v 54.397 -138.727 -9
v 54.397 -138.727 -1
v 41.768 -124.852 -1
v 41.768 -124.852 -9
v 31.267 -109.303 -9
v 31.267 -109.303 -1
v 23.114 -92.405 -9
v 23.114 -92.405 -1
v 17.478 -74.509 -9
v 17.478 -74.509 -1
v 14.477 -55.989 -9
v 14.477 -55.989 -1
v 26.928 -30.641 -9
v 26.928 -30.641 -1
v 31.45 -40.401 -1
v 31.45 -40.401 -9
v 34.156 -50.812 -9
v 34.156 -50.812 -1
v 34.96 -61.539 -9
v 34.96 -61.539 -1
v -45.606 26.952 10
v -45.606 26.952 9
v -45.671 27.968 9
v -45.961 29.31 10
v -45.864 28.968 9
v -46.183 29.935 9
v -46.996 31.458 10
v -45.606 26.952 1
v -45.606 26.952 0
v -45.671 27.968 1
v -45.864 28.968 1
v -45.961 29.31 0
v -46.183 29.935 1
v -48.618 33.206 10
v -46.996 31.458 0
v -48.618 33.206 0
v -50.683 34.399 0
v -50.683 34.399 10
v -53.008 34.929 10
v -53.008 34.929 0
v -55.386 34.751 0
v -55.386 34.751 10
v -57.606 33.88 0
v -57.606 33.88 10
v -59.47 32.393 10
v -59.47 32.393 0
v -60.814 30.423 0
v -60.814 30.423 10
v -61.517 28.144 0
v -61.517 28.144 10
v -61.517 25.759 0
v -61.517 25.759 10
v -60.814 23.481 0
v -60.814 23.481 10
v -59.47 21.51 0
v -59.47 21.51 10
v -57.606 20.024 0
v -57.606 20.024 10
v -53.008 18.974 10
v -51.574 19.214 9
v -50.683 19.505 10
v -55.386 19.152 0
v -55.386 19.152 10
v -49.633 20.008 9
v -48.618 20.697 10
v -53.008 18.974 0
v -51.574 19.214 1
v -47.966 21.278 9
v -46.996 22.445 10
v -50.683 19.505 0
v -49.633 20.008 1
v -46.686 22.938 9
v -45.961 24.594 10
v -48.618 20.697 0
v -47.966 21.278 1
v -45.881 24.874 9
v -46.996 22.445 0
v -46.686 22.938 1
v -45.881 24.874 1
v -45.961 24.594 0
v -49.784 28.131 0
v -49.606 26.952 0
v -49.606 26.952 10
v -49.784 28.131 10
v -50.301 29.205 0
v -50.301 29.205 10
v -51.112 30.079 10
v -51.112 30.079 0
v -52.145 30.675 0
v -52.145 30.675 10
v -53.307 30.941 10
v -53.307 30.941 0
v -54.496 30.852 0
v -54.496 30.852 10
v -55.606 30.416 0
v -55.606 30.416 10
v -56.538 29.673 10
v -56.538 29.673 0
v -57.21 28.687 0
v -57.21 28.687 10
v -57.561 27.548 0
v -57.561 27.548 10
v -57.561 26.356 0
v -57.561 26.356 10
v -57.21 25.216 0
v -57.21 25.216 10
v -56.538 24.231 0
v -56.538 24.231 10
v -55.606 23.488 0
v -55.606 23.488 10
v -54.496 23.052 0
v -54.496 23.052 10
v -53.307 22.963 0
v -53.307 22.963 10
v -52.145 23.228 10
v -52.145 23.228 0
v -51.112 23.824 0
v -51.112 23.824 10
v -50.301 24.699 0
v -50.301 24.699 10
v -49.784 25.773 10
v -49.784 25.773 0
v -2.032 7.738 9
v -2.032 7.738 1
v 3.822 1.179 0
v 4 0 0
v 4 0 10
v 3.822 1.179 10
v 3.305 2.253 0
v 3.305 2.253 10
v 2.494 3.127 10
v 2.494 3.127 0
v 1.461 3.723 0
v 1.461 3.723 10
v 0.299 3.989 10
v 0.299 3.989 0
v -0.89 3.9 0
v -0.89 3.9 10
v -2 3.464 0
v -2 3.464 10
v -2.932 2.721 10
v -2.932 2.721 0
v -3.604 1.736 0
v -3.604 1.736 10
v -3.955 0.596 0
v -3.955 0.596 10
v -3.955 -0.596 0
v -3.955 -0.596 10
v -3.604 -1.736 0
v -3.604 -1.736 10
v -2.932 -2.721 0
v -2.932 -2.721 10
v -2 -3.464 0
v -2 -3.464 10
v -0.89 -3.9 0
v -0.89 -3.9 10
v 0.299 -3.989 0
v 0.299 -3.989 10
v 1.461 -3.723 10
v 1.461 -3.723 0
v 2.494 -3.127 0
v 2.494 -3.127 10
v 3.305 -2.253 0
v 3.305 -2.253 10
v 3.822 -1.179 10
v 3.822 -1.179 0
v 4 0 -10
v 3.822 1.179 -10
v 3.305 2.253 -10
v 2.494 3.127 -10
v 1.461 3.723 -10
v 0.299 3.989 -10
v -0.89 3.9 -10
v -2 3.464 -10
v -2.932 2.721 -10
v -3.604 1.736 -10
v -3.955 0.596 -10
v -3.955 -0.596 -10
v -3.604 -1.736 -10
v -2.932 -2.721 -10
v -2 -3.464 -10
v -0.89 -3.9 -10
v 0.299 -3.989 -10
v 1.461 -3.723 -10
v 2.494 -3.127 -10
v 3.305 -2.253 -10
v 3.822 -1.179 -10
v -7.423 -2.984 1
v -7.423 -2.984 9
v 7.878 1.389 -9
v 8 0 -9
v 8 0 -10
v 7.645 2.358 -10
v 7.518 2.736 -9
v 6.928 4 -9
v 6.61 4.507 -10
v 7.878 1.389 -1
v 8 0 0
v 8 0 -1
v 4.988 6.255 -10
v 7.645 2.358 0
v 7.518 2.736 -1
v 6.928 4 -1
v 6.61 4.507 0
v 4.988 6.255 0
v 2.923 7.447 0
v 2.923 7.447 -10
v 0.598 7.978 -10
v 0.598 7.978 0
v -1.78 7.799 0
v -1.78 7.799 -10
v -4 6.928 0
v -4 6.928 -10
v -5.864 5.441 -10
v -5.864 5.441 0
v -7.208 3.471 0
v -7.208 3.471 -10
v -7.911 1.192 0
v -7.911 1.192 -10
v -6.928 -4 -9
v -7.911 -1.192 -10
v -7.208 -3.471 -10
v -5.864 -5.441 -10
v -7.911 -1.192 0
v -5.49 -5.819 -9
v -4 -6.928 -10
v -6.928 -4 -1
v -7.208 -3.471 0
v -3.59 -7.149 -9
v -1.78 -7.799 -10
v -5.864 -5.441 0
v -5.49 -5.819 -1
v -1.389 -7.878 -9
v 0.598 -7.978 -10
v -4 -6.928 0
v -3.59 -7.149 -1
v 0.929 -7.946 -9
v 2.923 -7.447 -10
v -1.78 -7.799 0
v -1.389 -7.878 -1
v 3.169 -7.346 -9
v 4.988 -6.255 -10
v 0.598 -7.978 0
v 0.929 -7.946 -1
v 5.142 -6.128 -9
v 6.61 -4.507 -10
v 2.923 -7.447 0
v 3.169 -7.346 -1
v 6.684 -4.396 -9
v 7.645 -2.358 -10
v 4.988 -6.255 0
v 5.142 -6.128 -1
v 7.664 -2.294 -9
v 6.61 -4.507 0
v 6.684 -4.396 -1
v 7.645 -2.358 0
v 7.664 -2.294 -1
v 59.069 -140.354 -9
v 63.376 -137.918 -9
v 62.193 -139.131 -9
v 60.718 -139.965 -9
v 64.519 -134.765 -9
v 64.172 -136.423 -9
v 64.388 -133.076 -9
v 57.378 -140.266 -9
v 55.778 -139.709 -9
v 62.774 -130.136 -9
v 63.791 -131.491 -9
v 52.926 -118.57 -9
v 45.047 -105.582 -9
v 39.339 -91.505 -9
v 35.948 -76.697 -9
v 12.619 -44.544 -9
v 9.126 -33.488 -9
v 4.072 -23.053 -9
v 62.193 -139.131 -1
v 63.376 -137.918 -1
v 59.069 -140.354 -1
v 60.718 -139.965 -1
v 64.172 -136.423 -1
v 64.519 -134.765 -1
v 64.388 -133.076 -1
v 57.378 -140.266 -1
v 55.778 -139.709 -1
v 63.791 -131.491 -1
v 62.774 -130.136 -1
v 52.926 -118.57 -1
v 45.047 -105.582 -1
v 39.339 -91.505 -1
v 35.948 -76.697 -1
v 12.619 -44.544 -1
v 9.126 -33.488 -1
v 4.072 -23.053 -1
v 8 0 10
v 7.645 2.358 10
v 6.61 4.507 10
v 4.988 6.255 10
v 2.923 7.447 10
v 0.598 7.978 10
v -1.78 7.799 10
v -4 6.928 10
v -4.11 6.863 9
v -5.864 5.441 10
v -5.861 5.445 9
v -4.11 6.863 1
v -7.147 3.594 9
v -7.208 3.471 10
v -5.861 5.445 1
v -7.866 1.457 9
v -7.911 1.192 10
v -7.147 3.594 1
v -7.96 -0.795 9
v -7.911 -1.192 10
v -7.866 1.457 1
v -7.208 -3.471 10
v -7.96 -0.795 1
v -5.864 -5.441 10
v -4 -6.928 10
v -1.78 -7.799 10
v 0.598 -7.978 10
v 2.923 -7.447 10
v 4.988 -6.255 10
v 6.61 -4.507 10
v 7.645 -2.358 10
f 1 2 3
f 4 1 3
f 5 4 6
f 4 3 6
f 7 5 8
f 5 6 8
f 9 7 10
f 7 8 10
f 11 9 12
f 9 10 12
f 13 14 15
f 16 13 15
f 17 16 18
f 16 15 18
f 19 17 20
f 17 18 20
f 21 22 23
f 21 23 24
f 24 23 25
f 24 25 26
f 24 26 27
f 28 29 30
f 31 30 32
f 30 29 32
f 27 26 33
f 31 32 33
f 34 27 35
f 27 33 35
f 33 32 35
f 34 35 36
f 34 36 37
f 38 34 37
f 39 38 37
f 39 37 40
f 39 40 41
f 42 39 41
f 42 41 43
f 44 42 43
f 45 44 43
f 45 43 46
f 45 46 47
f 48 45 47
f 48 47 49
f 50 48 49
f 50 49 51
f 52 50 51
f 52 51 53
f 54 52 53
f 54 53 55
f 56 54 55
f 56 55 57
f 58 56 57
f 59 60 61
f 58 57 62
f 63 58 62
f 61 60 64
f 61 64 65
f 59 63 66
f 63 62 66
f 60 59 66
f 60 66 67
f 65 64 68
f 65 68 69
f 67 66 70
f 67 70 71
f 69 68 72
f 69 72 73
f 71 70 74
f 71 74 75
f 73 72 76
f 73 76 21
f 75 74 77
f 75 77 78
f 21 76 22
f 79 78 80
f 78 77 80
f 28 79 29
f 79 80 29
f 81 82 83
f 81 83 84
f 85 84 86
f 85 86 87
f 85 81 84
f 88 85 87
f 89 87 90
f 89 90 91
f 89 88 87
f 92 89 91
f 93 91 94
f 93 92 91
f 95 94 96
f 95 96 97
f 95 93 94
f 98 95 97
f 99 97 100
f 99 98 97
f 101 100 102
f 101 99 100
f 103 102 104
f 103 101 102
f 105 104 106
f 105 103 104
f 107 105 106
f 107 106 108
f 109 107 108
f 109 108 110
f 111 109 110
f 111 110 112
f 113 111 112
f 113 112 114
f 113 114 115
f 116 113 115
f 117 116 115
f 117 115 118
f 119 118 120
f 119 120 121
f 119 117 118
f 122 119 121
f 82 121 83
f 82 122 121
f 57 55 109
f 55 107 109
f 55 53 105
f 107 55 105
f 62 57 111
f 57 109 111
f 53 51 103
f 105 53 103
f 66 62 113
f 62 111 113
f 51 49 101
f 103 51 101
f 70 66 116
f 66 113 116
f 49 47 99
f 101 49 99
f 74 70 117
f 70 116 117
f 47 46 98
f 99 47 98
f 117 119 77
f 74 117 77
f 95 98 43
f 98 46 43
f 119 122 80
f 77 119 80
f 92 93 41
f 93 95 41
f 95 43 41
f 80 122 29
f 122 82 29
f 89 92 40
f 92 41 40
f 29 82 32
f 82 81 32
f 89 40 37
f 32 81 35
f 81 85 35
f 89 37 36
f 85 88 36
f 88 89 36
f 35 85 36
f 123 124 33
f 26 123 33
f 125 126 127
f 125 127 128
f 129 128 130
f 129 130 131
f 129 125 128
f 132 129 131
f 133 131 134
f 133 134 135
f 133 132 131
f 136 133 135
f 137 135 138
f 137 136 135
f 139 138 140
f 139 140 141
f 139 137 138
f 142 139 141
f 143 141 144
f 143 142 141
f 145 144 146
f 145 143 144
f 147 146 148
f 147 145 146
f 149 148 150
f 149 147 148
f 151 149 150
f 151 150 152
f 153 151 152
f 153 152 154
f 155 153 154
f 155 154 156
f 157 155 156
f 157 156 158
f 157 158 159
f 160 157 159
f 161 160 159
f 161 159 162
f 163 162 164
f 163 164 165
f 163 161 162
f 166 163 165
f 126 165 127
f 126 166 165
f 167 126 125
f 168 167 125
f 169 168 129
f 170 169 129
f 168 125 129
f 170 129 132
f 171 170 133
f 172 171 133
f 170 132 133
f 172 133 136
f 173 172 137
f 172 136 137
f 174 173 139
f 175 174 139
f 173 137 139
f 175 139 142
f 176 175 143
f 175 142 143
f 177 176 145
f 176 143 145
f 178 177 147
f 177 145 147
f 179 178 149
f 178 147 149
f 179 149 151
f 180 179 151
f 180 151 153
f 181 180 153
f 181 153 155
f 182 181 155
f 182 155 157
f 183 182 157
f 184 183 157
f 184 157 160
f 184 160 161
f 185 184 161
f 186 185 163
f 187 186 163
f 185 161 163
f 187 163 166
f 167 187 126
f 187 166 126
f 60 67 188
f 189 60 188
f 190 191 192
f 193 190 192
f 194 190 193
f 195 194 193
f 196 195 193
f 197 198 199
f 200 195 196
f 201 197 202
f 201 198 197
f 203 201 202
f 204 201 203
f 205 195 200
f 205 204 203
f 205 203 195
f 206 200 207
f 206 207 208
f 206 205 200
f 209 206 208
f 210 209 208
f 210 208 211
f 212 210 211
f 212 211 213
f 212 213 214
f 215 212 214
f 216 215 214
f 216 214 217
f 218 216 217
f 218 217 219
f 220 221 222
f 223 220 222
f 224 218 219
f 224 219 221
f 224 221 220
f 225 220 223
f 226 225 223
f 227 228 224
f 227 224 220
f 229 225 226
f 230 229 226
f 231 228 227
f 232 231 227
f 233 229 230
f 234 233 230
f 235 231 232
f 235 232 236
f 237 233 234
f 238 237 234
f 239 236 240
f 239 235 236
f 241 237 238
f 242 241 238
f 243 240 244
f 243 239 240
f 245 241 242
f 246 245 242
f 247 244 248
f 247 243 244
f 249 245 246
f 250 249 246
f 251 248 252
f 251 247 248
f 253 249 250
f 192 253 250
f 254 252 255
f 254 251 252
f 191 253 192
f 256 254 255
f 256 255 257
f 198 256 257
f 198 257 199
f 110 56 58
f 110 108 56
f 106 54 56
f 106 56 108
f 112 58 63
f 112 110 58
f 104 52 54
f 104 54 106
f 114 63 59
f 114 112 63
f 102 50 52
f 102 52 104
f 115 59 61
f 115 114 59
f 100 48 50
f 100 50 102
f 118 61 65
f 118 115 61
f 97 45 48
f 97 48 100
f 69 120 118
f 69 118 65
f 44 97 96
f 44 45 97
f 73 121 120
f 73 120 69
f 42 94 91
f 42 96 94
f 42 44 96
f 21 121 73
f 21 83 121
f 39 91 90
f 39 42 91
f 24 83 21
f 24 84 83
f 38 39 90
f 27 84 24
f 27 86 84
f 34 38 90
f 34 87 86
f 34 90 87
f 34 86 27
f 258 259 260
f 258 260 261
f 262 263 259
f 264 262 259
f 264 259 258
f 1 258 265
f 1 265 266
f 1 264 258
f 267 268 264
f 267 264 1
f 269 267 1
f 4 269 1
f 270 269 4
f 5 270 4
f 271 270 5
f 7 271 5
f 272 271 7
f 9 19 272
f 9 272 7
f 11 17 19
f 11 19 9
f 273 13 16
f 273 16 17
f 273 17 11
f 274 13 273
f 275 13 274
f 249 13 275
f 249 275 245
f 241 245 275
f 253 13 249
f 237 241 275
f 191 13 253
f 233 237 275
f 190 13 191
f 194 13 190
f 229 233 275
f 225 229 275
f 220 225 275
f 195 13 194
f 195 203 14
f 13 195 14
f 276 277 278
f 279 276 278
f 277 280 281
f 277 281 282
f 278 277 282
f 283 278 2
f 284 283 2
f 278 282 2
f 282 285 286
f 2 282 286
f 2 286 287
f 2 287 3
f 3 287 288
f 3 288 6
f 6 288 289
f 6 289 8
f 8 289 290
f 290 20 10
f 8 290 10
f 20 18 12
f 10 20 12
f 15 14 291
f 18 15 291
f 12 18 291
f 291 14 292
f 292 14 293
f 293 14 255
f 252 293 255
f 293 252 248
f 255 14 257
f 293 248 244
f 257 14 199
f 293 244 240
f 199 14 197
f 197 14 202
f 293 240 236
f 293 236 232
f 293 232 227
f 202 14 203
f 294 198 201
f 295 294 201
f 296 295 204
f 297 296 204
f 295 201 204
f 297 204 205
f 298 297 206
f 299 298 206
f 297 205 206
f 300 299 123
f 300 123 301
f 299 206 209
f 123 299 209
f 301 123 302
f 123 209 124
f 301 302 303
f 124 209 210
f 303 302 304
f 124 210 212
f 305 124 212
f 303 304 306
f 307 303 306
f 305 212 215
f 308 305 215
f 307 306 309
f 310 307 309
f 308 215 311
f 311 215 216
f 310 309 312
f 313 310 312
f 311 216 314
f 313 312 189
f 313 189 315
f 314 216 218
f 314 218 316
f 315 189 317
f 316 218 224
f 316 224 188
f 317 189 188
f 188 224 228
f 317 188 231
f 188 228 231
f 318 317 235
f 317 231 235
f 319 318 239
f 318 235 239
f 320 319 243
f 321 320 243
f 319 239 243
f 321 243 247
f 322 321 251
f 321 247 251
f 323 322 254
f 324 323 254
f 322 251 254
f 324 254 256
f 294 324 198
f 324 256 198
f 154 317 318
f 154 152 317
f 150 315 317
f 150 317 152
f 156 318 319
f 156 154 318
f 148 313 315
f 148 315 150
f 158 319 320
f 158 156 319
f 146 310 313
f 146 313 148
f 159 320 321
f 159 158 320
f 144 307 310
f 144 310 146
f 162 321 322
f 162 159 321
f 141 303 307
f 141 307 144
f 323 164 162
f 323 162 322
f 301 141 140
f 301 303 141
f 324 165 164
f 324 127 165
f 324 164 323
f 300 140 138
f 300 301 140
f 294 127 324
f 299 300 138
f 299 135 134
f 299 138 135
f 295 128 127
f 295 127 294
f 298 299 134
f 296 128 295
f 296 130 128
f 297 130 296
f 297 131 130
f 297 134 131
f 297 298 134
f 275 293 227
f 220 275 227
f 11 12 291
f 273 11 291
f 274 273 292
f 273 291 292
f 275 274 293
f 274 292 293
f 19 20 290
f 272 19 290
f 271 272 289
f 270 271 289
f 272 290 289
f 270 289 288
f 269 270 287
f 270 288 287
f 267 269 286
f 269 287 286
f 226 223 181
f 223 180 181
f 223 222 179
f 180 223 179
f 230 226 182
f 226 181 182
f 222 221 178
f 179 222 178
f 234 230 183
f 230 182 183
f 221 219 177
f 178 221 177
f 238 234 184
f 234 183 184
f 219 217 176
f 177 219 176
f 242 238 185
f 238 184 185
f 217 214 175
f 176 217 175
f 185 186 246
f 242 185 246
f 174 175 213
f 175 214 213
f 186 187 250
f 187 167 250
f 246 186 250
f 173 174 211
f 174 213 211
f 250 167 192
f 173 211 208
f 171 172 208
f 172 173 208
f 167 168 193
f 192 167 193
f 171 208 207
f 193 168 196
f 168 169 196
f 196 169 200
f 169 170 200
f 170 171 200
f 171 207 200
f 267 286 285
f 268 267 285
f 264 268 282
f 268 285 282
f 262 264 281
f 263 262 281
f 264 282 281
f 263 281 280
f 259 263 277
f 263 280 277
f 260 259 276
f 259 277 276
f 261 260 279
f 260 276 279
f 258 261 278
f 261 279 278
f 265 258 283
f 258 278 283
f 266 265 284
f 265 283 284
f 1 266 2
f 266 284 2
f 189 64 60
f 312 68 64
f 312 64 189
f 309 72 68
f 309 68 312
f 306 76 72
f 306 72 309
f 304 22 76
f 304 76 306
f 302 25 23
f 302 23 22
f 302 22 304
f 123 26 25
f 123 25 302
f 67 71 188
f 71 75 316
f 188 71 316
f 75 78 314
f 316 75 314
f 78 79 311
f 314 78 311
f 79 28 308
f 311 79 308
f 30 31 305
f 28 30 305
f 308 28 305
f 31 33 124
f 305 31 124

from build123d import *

# Parameters (mm, degrees)
SKETCH_1_R        = 8
SKETCH_1_R_2      = 4
EXTRUDE_1_DEPTH   = 10
EXTRUDE_1_2_DEPTH = 10
EXTRUDE_START     = 1
EXTRUDE_2_DEPTH   = 8
EXTRUDE_START_2   = -1
EXTRUDE_3_DEPTH   = 8
SKETCH_5_R        = 8
SKETCH_5_R_2      = 4
EXTRUDE_4_DEPTH   = 10


with BuildPart() as part:
    # 草图1 → 凸台-拉伸1 (new body)
    with BuildSketch(Plane.XY):
        Circle(SKETCH_1_R)
        Circle(SKETCH_1_R_2, mode=Mode.SUBTRACT)
    extrude(amount=EXTRUDE_1_DEPTH)



with BuildPart() as body_2:
    # 草图1 → Extrude 1 2 (new body)
    with BuildSketch(Plane.XY):
        with Locations((-53.605968084, 26.951812291)):
            Circle(SKETCH_1_R)
        with Locations((-53.605968084, 26.951812291)):
            Circle(SKETCH_1_R_2, mode=Mode.SUBTRACT)
    extrude(amount=EXTRUDE_1_2_DEPTH)


with BuildPart() as part_1:
    add(part.part)

    add(body_2.part)  # 凸台-拉伸2 merges body 2
    # 草图3 → 凸台-拉伸2 (add)
    with BuildSketch(Plane.XY.offset(EXTRUDE_START)):
        with BuildLine():
            Line((-51.573547302, 19.214289059), (-7.42278324, -2.983670385))
            ThreePointArc((-7.42278324, -2.983670385), (-7.147462411, 3.593574972), (-2.032420782, 7.737523232))
            Line((-2.032420782, 7.737523232), (-46.183184844, 29.935482676))
            ThreePointArc((-46.183184844, 29.935482676), (-46.458505673, 23.358237319), (-51.573547302, 19.214289059))
        make_face()
    extrude(amount=EXTRUDE_2_DEPTH)



with BuildPart() as body_2_2:
    # 草图4 → 凸台-拉伸3 (new body)
    with BuildSketch(Plane.XY.offset(EXTRUDE_START_2)):
        with BuildLine():
            Line((6.92820323, 4), (26.92820323, -30.641016151))
            ThreePointArc((26.92820323, -30.641016151), (33.036798625, -45.545943872), (34.959960983, -61.538856509))
            ThreePointArc((34.959960983, -61.538856509), (41.911210079, -98.657642521), (62.774179905, -130.135581289))
            ThreePointArc((62.774179905, -130.135581289), (62.827441336, -138.566924041), (54.397444356, -138.726699833))
            ThreePointArc((54.397444356, -138.726699833), (26.885397662, -101.001387411), (14.477282647, -55.988604867))
            ThreePointArc((14.477282647, -55.988604867), (11.073298234, -38.952300047), (4.07179677, -23.052558883))
            Line((4.07179677, -23.052558883), (-6.92820323, -4))
            ThreePointArc((-6.92820323, -4), (4, -6.92820323), (6.92820323, 4))
        make_face()
    extrude(amount=-EXTRUDE_3_DEPTH)


with BuildPart() as part_2:
    add(part_1.part)

    add(body_2_2.part)  # 凸台-拉伸4 merges body 2 2
    # 草图5 → 凸台-拉伸4 (add)
    with BuildSketch(Plane.XY):
        Circle(SKETCH_5_R)
        Circle(SKETCH_5_R_2, mode=Mode.SUBTRACT)
    extrude(amount=-EXTRUDE_4_DEPTH)


solid = part_2.part
